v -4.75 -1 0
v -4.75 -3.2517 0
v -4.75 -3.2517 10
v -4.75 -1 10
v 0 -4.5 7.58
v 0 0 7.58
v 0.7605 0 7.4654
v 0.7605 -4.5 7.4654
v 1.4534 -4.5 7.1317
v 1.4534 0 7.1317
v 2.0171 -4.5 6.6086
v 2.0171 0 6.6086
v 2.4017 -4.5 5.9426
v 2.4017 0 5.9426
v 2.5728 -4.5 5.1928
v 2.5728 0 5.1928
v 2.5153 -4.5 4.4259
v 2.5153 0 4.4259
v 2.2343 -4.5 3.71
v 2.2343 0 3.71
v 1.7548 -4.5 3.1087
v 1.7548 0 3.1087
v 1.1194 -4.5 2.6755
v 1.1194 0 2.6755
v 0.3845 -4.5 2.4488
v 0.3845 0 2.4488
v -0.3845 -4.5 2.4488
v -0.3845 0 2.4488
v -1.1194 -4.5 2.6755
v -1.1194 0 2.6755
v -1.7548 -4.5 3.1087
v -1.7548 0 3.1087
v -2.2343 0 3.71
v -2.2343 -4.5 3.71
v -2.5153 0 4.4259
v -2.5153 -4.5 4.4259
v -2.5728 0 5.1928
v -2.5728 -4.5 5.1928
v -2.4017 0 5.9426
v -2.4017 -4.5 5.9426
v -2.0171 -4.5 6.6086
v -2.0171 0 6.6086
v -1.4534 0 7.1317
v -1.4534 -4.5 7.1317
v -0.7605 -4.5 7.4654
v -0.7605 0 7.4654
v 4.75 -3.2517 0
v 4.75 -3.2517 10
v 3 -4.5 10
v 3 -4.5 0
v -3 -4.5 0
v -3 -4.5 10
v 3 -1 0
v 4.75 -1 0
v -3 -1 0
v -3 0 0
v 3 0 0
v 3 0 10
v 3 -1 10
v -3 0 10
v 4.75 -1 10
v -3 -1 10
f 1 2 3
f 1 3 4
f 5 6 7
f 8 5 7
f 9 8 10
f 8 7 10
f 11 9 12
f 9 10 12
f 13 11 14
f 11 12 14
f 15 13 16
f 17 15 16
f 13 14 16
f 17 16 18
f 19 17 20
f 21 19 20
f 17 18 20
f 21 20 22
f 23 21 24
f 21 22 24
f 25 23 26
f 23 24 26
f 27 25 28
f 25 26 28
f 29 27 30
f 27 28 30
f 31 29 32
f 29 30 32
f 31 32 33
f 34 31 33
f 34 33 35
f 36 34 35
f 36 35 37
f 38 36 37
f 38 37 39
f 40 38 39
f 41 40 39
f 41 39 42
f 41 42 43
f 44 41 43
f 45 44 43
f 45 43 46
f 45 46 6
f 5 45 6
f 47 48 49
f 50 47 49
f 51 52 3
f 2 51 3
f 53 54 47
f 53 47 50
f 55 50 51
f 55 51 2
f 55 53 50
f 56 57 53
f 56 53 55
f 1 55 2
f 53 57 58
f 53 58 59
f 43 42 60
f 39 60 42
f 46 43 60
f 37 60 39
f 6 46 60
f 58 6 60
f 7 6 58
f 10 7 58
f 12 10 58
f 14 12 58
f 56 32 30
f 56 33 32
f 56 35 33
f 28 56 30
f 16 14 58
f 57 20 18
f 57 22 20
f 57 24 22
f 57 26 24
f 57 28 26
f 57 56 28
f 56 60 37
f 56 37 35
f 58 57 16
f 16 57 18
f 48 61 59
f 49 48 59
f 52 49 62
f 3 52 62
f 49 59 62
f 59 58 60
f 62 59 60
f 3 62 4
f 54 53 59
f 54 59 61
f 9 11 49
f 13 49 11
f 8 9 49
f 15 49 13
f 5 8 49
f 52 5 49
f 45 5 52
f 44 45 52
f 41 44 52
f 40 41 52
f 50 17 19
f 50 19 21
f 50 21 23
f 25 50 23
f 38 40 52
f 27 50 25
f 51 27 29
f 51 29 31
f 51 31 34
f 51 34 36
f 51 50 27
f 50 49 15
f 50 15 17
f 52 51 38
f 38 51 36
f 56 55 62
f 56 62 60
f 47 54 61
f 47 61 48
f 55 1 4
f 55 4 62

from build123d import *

# Parameters (mm, degrees)
EXTRUDE_1_DEPTH     = 10
CUT_EXTRUDE_1_REACH = 13.95
SKETCH_2_R          = 2.58


with BuildPart() as part:
    # 草图1 → 凸台-拉伸1 (new body)
    with BuildSketch(Plane.XY):
        Polygon((-3, 0), (3, 0), (3, -1), (4.75, -1), (4.75, -3.251737131), (3, -4.5), (-3, -4.5), (-4.75, -3.251737131), (-4.75, -1), (-3, -1), align=None)
    extrude(amount=EXTRUDE_1_DEPTH)

    # 草图2 → 切除-拉伸1 (cut, up to next)
    with BuildSketch(Plane(origin=(0, 0, 0), x_dir=(1, 0, 0), z_dir=(0, 1, 0)), mode=Mode.PRIVATE) as cut_extrude_1_sk1:
        with Locations(Location((0, -5, 0), (0, 0, 270))):
            Circle(SKETCH_2_R)
    cut_extrude_1_tool1 = extrude(cut_extrude_1_sk1.sketch, amount=-CUT_EXTRUDE_1_REACH, mode=Mode.PRIVATE) & part.part
    add(cut_extrude_1_tool1.solids().sort_by_distance((0, 0, 5))[0], mode=Mode.SUBTRACT)


solid = part.part
